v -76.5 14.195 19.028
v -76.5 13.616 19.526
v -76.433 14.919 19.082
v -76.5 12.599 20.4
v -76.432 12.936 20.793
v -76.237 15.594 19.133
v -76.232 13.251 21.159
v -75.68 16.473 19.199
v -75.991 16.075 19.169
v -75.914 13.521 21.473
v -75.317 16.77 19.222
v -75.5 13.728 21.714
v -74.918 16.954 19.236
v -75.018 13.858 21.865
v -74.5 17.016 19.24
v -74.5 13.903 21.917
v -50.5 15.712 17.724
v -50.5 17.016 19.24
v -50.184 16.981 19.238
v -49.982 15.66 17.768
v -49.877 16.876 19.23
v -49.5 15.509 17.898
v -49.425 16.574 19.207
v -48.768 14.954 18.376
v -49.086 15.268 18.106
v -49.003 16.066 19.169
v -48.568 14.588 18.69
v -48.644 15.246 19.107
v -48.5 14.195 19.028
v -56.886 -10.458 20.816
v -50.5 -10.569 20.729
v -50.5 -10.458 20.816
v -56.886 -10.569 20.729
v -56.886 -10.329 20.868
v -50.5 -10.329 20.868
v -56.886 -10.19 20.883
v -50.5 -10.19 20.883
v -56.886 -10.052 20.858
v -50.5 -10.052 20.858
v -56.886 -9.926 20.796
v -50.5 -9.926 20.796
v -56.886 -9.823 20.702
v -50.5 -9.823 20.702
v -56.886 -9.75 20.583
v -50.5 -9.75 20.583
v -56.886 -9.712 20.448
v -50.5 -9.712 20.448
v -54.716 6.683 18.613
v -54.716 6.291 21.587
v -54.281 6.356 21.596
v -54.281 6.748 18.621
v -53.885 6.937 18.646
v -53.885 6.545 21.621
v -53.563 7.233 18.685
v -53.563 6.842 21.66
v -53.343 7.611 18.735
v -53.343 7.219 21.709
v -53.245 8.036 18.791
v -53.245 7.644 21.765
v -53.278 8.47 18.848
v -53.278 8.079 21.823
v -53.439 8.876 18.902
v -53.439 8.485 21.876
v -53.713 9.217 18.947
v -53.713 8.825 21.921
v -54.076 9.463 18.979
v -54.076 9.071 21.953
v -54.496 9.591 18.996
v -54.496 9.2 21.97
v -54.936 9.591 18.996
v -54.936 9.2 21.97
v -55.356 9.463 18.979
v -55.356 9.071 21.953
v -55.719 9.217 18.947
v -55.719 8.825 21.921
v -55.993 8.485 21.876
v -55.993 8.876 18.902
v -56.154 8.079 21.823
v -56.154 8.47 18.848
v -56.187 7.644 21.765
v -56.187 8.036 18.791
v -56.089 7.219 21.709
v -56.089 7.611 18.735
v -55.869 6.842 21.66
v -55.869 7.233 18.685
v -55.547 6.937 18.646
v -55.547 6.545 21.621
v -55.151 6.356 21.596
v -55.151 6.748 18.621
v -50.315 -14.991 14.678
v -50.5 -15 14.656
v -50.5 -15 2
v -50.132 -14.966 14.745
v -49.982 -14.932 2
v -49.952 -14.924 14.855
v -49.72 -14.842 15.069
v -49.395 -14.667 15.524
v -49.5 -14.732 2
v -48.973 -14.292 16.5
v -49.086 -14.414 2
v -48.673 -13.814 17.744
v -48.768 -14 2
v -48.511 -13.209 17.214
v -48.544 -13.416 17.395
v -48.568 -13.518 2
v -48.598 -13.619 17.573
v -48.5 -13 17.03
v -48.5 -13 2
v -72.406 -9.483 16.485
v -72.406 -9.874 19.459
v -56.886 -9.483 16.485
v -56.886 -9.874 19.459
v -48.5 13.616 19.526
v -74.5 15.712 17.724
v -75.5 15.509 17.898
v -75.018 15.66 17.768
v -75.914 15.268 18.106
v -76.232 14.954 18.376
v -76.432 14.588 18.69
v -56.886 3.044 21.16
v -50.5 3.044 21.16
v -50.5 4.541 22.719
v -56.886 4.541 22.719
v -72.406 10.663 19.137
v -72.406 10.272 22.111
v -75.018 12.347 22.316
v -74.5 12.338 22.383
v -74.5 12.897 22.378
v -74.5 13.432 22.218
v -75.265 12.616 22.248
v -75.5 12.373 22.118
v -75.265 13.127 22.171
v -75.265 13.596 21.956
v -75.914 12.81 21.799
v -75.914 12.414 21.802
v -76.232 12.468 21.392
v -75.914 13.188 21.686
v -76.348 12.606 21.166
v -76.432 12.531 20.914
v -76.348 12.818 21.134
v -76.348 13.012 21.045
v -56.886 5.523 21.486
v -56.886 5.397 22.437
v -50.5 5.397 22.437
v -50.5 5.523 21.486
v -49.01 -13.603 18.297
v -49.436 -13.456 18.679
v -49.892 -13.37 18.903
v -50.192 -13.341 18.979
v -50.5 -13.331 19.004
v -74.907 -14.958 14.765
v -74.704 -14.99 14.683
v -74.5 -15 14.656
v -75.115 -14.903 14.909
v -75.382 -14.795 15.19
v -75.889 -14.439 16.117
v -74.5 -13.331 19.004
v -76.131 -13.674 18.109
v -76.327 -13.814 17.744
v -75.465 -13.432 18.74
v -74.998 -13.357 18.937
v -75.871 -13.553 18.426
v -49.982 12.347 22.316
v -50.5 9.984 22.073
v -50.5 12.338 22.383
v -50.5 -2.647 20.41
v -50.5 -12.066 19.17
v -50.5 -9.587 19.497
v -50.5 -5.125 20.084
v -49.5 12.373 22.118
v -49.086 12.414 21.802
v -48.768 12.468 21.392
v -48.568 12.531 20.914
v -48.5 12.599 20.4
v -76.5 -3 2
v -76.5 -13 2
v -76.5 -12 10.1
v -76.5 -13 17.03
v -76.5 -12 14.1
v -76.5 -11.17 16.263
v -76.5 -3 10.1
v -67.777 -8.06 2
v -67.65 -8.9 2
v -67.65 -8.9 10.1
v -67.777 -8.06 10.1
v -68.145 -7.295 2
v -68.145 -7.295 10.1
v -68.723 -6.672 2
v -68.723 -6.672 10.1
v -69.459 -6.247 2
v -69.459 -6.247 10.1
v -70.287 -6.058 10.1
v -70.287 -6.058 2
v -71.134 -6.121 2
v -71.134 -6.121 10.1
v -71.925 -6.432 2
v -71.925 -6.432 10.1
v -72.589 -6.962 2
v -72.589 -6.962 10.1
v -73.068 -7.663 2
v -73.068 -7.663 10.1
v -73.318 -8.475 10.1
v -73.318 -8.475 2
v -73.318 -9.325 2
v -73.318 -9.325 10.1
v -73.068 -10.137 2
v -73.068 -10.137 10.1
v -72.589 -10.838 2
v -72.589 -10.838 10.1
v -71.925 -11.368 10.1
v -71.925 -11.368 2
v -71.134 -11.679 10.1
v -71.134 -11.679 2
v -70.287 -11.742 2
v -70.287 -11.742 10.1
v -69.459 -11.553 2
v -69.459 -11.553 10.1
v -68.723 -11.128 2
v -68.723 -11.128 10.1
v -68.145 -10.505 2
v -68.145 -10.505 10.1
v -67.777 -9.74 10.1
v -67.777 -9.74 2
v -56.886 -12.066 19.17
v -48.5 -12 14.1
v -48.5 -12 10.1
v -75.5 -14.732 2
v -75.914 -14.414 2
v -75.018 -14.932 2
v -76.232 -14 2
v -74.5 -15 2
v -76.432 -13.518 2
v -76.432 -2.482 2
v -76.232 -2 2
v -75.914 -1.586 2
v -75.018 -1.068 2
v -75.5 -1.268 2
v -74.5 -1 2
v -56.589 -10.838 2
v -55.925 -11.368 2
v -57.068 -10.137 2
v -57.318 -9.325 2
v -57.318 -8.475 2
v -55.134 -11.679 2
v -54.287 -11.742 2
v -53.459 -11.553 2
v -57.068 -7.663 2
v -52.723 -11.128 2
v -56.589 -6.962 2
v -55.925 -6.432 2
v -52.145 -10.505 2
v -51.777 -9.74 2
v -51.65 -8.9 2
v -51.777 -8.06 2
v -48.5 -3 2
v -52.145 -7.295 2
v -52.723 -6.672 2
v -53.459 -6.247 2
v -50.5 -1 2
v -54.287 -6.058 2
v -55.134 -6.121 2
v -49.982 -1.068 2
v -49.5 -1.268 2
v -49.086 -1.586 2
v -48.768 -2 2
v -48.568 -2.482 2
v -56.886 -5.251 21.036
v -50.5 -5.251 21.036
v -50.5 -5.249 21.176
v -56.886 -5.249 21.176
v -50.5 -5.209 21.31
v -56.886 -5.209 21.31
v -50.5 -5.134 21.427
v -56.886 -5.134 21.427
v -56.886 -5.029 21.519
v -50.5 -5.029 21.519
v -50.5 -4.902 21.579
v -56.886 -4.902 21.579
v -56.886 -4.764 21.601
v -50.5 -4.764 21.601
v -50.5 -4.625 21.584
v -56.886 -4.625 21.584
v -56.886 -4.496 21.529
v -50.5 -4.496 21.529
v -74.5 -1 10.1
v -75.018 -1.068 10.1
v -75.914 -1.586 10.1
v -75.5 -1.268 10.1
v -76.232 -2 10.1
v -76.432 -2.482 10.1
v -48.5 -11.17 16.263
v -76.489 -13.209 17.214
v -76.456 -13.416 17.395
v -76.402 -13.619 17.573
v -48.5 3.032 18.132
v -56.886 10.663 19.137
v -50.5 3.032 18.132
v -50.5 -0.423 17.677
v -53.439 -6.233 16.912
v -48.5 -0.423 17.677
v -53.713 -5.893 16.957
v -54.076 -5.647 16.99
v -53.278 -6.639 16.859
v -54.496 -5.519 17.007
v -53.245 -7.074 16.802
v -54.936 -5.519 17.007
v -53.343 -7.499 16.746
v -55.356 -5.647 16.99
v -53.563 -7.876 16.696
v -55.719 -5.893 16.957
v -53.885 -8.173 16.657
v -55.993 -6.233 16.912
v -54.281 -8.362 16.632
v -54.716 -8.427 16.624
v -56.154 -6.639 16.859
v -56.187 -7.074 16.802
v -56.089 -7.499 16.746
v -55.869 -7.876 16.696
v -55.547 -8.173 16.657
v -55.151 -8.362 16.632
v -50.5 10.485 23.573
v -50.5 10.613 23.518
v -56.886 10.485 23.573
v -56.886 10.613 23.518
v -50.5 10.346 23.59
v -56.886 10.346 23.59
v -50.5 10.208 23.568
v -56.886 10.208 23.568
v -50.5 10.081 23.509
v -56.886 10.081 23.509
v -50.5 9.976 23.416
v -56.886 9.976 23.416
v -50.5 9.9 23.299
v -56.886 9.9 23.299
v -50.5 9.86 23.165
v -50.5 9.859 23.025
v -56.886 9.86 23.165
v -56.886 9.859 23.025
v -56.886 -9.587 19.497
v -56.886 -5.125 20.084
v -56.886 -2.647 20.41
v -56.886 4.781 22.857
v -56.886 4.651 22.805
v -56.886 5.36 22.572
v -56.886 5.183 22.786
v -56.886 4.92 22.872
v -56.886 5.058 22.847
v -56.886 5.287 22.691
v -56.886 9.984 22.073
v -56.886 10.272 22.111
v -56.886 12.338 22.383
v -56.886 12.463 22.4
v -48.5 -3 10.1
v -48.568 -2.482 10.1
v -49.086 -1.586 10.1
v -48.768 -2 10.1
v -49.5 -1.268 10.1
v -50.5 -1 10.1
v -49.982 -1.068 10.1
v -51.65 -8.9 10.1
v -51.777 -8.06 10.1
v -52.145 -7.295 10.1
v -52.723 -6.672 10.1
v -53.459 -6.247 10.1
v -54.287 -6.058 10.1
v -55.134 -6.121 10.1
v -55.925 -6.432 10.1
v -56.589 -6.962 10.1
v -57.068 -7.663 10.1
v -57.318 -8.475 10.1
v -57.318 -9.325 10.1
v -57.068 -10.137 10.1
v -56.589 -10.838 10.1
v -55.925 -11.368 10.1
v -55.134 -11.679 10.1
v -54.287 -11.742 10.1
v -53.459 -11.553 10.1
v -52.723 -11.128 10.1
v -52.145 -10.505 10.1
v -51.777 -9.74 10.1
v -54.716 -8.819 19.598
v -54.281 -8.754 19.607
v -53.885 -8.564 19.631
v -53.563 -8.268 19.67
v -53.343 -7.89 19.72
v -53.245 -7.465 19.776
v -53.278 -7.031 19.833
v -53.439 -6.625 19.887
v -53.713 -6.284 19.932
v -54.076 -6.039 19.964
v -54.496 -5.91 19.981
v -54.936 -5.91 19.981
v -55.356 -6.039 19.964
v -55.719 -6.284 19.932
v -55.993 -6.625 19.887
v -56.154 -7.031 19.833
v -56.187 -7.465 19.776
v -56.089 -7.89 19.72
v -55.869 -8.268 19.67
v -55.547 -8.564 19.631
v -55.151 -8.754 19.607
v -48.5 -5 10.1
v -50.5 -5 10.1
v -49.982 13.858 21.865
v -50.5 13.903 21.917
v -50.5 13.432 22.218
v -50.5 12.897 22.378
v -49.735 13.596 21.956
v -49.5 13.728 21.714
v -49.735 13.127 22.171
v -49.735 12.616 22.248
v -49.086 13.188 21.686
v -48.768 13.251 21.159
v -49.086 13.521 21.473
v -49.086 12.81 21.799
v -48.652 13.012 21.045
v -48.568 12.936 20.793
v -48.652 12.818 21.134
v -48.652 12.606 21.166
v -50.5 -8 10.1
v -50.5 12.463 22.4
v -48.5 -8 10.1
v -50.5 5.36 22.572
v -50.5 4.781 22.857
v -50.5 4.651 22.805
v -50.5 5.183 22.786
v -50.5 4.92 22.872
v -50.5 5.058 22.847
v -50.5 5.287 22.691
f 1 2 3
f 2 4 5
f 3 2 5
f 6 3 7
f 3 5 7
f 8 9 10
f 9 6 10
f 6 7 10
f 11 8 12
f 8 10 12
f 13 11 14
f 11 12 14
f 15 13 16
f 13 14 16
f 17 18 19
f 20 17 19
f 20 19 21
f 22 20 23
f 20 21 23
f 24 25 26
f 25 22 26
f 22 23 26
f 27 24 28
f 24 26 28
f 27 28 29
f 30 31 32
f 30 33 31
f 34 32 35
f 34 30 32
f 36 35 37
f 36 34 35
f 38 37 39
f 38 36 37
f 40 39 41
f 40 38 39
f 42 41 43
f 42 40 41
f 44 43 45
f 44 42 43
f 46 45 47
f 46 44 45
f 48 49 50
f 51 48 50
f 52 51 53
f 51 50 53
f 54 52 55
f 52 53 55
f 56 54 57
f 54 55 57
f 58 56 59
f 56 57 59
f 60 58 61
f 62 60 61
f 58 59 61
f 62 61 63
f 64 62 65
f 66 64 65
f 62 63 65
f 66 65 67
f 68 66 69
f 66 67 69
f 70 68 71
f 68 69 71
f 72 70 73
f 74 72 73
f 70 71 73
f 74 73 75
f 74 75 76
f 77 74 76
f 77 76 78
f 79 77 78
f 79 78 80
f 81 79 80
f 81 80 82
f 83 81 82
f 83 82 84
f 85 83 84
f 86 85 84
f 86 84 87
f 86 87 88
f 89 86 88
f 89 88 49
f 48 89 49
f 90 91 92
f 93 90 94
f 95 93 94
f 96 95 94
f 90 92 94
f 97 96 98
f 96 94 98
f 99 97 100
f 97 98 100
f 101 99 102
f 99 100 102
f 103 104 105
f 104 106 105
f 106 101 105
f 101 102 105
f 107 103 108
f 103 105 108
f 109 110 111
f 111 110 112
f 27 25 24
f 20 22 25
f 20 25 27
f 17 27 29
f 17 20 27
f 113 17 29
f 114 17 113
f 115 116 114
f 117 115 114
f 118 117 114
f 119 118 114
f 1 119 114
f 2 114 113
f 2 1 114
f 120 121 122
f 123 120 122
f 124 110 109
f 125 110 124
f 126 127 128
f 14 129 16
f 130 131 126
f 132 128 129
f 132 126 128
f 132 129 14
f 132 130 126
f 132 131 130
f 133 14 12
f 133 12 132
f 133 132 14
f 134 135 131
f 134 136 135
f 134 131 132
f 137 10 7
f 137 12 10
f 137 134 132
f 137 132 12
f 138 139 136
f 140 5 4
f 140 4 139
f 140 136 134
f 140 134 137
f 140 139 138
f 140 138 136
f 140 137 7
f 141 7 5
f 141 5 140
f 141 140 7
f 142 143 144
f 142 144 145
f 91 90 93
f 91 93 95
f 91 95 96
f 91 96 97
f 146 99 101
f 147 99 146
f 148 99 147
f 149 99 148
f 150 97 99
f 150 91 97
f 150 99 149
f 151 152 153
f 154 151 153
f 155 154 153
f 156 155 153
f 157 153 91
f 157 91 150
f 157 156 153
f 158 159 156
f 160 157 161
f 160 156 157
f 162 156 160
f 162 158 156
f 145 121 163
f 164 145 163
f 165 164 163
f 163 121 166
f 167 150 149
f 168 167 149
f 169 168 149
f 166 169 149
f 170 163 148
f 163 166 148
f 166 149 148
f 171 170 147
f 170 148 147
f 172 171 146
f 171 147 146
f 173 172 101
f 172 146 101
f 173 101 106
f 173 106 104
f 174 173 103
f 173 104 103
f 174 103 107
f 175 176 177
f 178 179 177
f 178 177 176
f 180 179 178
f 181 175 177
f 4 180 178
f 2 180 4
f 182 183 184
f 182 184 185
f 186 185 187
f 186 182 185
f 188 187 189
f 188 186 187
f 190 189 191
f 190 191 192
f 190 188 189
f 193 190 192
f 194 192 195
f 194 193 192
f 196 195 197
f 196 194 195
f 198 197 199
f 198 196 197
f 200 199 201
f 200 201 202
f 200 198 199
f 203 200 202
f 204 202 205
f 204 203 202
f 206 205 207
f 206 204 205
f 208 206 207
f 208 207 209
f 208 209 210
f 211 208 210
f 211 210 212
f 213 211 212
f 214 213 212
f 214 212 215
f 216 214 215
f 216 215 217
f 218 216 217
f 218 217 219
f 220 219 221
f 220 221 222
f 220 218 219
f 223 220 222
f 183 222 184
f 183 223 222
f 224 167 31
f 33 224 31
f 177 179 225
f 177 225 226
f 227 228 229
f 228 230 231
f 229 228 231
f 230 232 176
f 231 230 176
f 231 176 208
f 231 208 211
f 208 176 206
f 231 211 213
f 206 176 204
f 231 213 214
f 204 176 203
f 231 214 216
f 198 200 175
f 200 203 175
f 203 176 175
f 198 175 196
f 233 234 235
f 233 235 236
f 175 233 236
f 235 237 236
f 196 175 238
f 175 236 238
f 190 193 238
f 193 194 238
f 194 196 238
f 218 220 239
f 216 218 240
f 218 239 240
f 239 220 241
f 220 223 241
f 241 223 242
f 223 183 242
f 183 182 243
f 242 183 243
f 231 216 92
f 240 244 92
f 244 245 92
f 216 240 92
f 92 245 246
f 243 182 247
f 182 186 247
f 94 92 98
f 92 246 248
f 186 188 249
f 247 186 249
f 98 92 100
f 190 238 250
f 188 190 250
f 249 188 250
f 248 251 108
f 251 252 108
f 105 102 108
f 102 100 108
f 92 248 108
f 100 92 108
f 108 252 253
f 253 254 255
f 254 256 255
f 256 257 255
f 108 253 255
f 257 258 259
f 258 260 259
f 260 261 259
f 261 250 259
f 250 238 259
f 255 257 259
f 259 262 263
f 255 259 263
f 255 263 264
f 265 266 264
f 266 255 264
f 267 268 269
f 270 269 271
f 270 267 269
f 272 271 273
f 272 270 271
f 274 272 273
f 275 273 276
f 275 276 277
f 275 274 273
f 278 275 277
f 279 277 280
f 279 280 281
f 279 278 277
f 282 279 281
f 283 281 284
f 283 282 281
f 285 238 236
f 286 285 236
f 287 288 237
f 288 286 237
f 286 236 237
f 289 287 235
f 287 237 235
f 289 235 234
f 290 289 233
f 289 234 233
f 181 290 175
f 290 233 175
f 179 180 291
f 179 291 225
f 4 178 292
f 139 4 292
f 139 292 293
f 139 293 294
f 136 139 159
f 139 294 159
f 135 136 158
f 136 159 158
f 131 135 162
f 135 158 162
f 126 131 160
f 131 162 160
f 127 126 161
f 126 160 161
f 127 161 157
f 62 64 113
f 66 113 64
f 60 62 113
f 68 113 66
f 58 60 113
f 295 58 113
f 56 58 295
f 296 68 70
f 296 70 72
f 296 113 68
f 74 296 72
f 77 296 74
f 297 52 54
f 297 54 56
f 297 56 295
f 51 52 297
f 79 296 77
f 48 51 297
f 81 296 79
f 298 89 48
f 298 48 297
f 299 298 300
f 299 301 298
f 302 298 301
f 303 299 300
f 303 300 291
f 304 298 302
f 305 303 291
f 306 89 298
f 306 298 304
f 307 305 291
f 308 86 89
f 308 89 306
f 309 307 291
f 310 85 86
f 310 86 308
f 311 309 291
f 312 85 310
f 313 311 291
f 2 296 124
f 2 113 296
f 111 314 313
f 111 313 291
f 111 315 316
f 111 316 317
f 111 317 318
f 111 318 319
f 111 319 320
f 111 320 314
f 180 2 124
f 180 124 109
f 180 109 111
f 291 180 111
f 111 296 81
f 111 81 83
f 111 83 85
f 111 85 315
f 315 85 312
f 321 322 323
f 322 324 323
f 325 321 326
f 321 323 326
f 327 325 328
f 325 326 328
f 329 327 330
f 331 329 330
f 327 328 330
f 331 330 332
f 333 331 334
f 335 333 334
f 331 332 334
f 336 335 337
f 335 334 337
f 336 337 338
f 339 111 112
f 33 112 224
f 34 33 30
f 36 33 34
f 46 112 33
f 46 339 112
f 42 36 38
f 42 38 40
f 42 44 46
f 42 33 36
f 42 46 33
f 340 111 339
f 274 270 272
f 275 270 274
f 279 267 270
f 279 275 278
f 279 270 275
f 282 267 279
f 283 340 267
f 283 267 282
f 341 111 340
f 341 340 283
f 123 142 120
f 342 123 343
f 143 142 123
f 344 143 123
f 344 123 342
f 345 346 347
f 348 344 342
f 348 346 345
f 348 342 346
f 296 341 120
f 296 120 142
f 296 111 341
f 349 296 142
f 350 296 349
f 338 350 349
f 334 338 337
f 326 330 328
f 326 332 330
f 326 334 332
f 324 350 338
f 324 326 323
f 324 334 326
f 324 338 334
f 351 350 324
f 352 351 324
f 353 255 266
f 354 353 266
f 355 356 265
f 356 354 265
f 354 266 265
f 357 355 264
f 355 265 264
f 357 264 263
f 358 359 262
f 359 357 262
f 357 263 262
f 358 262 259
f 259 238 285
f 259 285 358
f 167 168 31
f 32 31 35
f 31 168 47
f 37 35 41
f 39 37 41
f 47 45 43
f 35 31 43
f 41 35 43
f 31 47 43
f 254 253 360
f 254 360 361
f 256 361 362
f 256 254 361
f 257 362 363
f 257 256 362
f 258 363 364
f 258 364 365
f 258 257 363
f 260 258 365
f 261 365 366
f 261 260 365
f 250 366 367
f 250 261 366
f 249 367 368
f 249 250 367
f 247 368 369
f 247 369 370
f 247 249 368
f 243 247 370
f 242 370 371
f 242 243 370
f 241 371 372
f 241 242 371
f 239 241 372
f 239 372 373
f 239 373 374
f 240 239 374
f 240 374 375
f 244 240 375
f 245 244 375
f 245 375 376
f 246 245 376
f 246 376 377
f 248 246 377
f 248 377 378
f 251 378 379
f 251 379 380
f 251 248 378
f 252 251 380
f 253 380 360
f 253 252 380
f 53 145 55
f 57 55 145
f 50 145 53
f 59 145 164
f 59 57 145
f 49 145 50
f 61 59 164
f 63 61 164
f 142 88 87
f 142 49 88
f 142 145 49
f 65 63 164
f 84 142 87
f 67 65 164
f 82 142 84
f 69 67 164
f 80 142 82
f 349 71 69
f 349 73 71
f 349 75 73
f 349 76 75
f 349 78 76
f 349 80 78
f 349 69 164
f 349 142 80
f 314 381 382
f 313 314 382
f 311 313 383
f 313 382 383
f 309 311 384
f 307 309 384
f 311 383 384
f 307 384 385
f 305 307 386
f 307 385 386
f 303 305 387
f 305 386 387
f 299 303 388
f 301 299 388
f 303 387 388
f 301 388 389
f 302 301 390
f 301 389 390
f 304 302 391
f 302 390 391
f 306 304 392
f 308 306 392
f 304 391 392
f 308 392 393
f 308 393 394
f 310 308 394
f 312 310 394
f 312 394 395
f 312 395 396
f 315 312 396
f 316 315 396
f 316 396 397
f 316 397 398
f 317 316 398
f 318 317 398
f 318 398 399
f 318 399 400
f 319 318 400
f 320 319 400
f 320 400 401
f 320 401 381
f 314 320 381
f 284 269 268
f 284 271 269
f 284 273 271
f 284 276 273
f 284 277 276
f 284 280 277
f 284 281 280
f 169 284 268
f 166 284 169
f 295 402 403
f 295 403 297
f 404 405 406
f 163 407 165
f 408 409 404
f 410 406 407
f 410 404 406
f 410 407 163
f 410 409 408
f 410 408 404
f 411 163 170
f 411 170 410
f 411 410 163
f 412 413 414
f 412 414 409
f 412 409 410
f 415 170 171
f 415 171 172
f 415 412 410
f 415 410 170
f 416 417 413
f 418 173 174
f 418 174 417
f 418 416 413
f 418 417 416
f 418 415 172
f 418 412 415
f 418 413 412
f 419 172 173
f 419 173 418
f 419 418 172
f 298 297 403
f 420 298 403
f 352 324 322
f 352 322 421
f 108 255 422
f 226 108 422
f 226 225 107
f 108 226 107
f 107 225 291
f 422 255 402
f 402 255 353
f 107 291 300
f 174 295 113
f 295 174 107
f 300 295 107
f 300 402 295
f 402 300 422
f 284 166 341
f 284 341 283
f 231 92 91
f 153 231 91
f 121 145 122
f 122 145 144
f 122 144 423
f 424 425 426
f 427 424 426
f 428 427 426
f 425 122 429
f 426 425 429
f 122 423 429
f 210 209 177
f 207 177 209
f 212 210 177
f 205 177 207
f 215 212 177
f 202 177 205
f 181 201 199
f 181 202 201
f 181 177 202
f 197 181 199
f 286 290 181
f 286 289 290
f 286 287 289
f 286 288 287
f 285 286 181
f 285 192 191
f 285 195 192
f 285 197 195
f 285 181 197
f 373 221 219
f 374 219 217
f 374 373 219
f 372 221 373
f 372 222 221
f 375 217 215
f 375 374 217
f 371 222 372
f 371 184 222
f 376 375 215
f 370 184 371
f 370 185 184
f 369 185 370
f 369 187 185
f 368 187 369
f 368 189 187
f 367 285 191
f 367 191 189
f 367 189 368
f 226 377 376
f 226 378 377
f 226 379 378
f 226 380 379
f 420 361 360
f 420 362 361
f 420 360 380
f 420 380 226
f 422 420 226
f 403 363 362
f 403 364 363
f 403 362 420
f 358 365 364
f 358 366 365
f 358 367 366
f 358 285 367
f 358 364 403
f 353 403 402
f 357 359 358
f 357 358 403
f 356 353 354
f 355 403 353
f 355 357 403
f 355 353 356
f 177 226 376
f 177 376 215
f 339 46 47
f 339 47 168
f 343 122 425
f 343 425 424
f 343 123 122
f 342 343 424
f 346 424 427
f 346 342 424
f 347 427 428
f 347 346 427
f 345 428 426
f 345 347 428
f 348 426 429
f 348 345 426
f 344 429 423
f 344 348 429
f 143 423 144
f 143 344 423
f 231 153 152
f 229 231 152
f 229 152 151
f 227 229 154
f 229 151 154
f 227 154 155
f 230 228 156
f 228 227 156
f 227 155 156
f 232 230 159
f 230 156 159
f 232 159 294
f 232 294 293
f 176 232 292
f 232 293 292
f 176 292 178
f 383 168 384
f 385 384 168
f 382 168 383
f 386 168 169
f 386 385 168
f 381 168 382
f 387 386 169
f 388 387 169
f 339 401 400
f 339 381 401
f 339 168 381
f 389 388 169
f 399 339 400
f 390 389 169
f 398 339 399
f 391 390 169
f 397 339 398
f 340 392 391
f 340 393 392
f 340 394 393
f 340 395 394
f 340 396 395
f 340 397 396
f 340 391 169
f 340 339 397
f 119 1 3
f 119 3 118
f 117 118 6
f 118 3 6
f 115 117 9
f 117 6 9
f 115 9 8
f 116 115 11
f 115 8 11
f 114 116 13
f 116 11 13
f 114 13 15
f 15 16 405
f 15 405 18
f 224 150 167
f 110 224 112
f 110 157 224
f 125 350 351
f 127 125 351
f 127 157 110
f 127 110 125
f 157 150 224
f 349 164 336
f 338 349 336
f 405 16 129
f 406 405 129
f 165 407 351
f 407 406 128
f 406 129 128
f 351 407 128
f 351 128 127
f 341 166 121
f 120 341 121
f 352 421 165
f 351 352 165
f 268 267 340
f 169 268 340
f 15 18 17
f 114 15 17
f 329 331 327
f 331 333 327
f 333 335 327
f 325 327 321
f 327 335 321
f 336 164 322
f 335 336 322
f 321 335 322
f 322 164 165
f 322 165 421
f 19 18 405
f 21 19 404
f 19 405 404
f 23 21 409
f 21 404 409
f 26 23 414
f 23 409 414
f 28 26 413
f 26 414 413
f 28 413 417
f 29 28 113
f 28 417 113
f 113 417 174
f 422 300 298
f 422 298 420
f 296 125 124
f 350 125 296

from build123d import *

# Parameters (mm, degrees)
BOSS_EXTRUDE1_START = 2
SKETCH2_W           = 28
SKETCH2_H           = 14
SKETCH2_R           = 2.85
BOSS_EXTRUDE1_DEPTH = 8.1
BOSS_EXTRUDE5_DEPTH = 28
CUT_EXTRUDE1_REACH  = 83.112
SKETCH7_R           = 1.475
SKETCH7_W           = 15.52
SKETCH7_H           = 20.32
BOSS_EXTRUDE7_DEPTH = 2
FILLET1_R           = 2
BOSS_EXTRUDE8_START = -2
BOSS_EXTRUDE8_DEPTH = 6.386
FILLET2_R           = 0.5


with BuildPart() as part:
    # Sketch2 → Boss-Extrude1 (new body)
    with BuildSketch(Plane.XY.offset(BOSS_EXTRUDE1_START)):
        with Locations((-62.5, -8)):
            Rectangle(SKETCH2_W, SKETCH2_H)
        with Locations((-54.5, -8.9)):
            Circle(SKETCH2_R, mode=Mode.SUBTRACT)
        with Locations((-70.5, -8.9)):
            Circle(SKETCH2_R, mode=Mode.SUBTRACT)
    extrude(amount=BOSS_EXTRUDE1_DEPTH)

    # Sketch6 → Boss-Extrude5 (add)
    with BuildSketch(Plane.ZY.offset(76.5)):
        Polygon((10.1, -15), (14.656017135, -15), (19.003880422, -13.331011655), (22.5, 13.224653006), (19.240190464, 17.015911609), (17.723687023, 15.711987794), (19.525665416, 13.616231583), (16.26251061, -11.169889951), (14.1, -12), (10.1, -12), align=None)
    extrude(amount=-BOSS_EXTRUDE5_DEPTH)

    # Sketch7 → Cut-Extrude1 (cut, up to next)
    with BuildSketch(Plane(origin=(0, -2.686404695, 20.405269514), x_dir=(1, 0, 0), z_dir=(0, -0.13052619222004436, 0.9914448613738114)), mode=Mode.PRIVATE) as cut_extrude1_sk1:
        with Locations(Location((-54.716, -4.710052631, 0), (0, 0, 270))):
            Circle(SKETCH7_R)
    cut_extrude1_tool1 = extrude(cut_extrude1_sk1.sketch, amount=-CUT_EXTRUDE1_REACH, mode=Mode.PRIVATE) & part.part
    # Sketch7 → Cut-Extrude1 (cut, up to next)
    with BuildSketch(Plane(origin=(0, -2.686404695, 20.405269514), x_dir=(1, 0, 0), z_dir=(0, -0.13052619222004436, 0.9914448613738114)), mode=Mode.PRIVATE) as cut_extrude1_sk2:
        with Locations(Location((-54.716, 10.529947369, 0), (0, 0, 270))):
            Circle(SKETCH7_R)
    cut_extrude1_tool2 = extrude(cut_extrude1_sk2.sketch, amount=-CUT_EXTRUDE1_REACH, mode=Mode.PRIVATE) & part.part
    # Sketch7 → Cut-Extrude1 (cut, up to next)
    with BuildSketch(Plane(origin=(0, -2.686404695, 20.405269514), x_dir=(1, 0, 0), z_dir=(0, -0.13052619222004436, 0.9914448613738114)), mode=Mode.PRIVATE) as cut_extrude1_sk3:
        with Locations((-64.646, 2.909947369)):
            Rectangle(SKETCH7_W, SKETCH7_H)
    cut_extrude1_tool3 = extrude(cut_extrude1_sk3.sketch, amount=-CUT_EXTRUDE1_REACH, mode=Mode.PRIVATE) & part.part
    add(cut_extrude1_tool1.solids().sort_by_distance((-54.716, -7.356162, 19.790484))[0], mode=Mode.SUBTRACT)
    add(cut_extrude1_tool2.solids().sort_by_distance((-54.716, 7.753458, 21.779703))[0], mode=Mode.SUBTRACT)
    add(cut_extrude1_tool3.solids().sort_by_distance((-64.646, 0.198648, 20.785094))[0], mode=Mode.SUBTRACT)

    # Sketch10 → Boss-Extrude7 (add)
    with BuildSketch(Plane(origin=(-48.5, 0, 0), x_dir=(0, 0, -1), z_dir=(1, 0, 0))):
        Polygon((-18.13225899, 3.03225899), (-17.67742093, -0.42257907), (-10.1, -8), (-10.1, -5), align=None)
    extrude(amount=-BOSS_EXTRUDE7_DEPTH)

    # Fillet1
    # the kernel refuses this fillet: 2 mm, written as the material it takes off along each edge
    with BuildSketch(Plane(origin=(-50.5, 12.598930148, 20.400364102), x_dir=(0, 0.6519619071782031, 0.758251720465282), z_dir=(1, 0, 0))) as fillet1_piece_1_section:
        Polygon((0, 0), (FILLET1_R * 1.02, 0), (FILLET1_R * 1.02, FILLET1_R * 0.45615786741), (FILLET1_R * 0.68, FILLET1_R * 0.76026311235), align=None)
    fillet1_piece_1 = extrude(amount=FILLET1_R * 1.02, mode=Mode.PRIVATE)
    fillet1_piece_1 = fillet1_piece_1 - Plane(origin=(-50.5, 12.598930148, 20.400364102), x_dir=(0, -0.28560210337141756, -0.9583482866629555), z_dir=(1, 0, 0)) * Sphere(FILLET1_R, mode=Mode.PRIVATE)
    add(fillet1_piece_1, mode=Mode.SUBTRACT)
    with BuildSketch(Plane(origin=(-74.5, 12.598930148, 20.400364102), x_dir=(0, 0.6519619071782031, 0.758251720465282), z_dir=(-1, 0, 0))) as fillet1_piece_2_section:
        Polygon((0, 0), (FILLET1_R * 1.02, 0), (FILLET1_R * 1.02, -FILLET1_R * 0.45615786741), (FILLET1_R * 0.68, -FILLET1_R * 0.76026311235), align=None)
    fillet1_piece_2 = extrude(amount=FILLET1_R * 1.02, mode=Mode.PRIVATE)
    fillet1_piece_2 = fillet1_piece_2 - Plane(origin=(-74.5, 12.598930148, 20.400364102), x_dir=(0, -0.28560210337141756, -0.9583482866629555), z_dir=(-1, 0, 0)) * Sphere(FILLET1_R, mode=Mode.PRIVATE)
    add(fillet1_piece_2, mode=Mode.SUBTRACT)
    with BuildSketch(Plane(origin=(-76.5, -15, 19.656017135), x_dir=(1, 0, 0), z_dir=(0, 0, -1)), Plane(origin=(-48.5, -15, -3), x_dir=(-1, 0, 0), z_dir=(0, 0, 1))) as fillet1_piece_3:
        with BuildLine():
            CenterArc((FILLET1_R, -FILLET1_R), FILLET1_R, 90, 90)
            Line((0, -FILLET1_R), (0, 0))
            Line((0, 0), (FILLET1_R, 0))
        make_face()
    extrude(amount=22.656017135, mode=Mode.SUBTRACT)
    with BuildSketch(Plane(origin=(-76.5, -1, -3), x_dir=(0, -1, 0), z_dir=(0, 0, 1))) as fillet1_piece_4:
        with BuildLine():
            CenterArc((FILLET1_R, FILLET1_R), FILLET1_R, 180, 90)
            Line((0, FILLET1_R), (0, 0))
            Line((0, 0), (FILLET1_R, 0))
        make_face()
    extrude(amount=18.1, mode=Mode.SUBTRACT)
    with BuildSketch(Plane(origin=(-48.5, -1, -3), x_dir=(0, -1, 0), z_dir=(0, 0, 1))) as fillet1_piece_5_section:
        with BuildLine():
            CenterArc((FILLET1_R, -FILLET1_R), FILLET1_R, 90, 90)
            Line((0, -FILLET1_R), (0, 0))
            Line((0, 0), (FILLET1_R, 0))
        make_face()
    fillet1_piece_5 = extrude(amount=18.1, mode=Mode.PRIVATE)
    fillet1_piece_5 = split(fillet1_piece_5, bisect_by=Plane(origin=(-48.946735878, -5.248367939, 9.851632061), z_dir=(0, 0.707106781186545, -0.7071067811865501)), keep=Keep.TOP, mode=Mode.PRIVATE)
    add(fillet1_piece_5, mode=Mode.SUBTRACT)
    with BuildSketch(Plane(origin=(-48.5, 13.902853963, 21.916867543), x_dir=(0, -0.6519619071782031, -0.758251720465282), z_dir=(0, 0.758251720465282, -0.6519619071782031))) as fillet1_piece_6:
        with BuildLine():
            CenterArc((FILLET1_R, FILLET1_R), FILLET1_R, 180, 90)
            Line((0, FILLET1_R), (0, 0))
            Line((0, 0), (FILLET1_R, 0))
        make_face()
    extrude(amount=9.105572809, mode=Mode.SUBTRACT)
    with BuildSketch(Plane(origin=(-76.5, 13.902853963, 21.916867543), x_dir=(0, -0.6519619071782031, -0.758251720465282), z_dir=(0, 0.758251720465282, -0.6519619071782031))) as fillet1_piece_7:
        with BuildLine():
            CenterArc((FILLET1_R, -FILLET1_R), FILLET1_R, 90, 90)
            Line((0, -FILLET1_R), (0, 0))
            Line((0, 0), (FILLET1_R, 0))
        make_face()
    extrude(amount=9.105572809, mode=Mode.SUBTRACT)
    with BuildSketch(Plane(origin=(-48.5, -18.288235962, 18.351249461), x_dir=(0, 0.1305261922200442, -0.9914448613738114), z_dir=(0, 0.9914448613738114, 0.13052619222004422))) as fillet1_piece_8:
        with BuildLine():
            CenterArc((FILLET1_R, FILLET1_R), FILLET1_R, 180, 90)
            Line((0, FILLET1_R), (0, 0))
            Line((0, 0), (FILLET1_R, 0))
        make_face()
    extrude(amount=30.890385254, mode=Mode.SUBTRACT)
    with BuildSketch(Plane(origin=(-76.5, -18.288235962, 18.351249461), x_dir=(0, 0.1305261922200442, -0.9914448613738114), z_dir=(0, 0.9914448613738114, 0.13052619222004422))) as fillet1_piece_9:
        with BuildLine():
            CenterArc((FILLET1_R, -FILLET1_R), FILLET1_R, 90, 90)
            Line((0, -FILLET1_R), (0, 0))
            Line((0, 0), (FILLET1_R, 0))
        make_face()
    extrude(amount=30.890385254, mode=Mode.SUBTRACT)
    with BuildSketch(Plane(origin=(-74.5, 13.224653006, 22.5), x_dir=(0, 0.7582517204652818, -0.6519619071782033), z_dir=(1, 0, 0))) as fillet1_piece_10:
        with BuildLine():
            CenterArc((FILLET1_R * 0.4472135955, -FILLET1_R), FILLET1_R, 90, 48.189685104)
            Line((-FILLET1_R * 0.298142397, -FILLET1_R * 0.333333333333), (0, 0))
            Line((0, 0), (FILLET1_R * 0.4472135955, 0))
        make_face()
    extrude(amount=24, mode=Mode.SUBTRACT)
    with BuildSketch(Plane(origin=(-48.5, 20.275721145, 23.031449066), x_dir=(0, -0.7582517204652808, 0.6519619071782047), z_dir=(0, -0.6519619071782047, -0.7582517204652808))) as fillet1_piece_11:
        with BuildLine():
            CenterArc((FILLET1_R, FILLET1_R), FILLET1_R, 180, 90)
            Line((0, FILLET1_R), (0, 0))
            Line((0, 0), (FILLET1_R, 0))
        make_face()
    extrude(amount=12, mode=Mode.SUBTRACT)
    with BuildSketch(Plane(origin=(-76.5, 20.275721145, 23.031449066), x_dir=(0, -0.7582517204652808, 0.6519619071782046), z_dir=(0, -0.6519619071782047, -0.7582517204652808))) as fillet1_piece_12:
        with BuildLine():
            CenterArc((FILLET1_R, -FILLET1_R), FILLET1_R, 90, 90)
            Line((0, -FILLET1_R), (0, 0))
            Line((0, 0), (FILLET1_R, 0))
        make_face()
    extrude(amount=12, mode=Mode.SUBTRACT)

    # Sketch11 → Boss-Extrude8 (add)
    with BuildSketch(Plane(origin=(-48.5, 0, 0), x_dir=(0, 0, -1), z_dir=(1, 0, 0)).offset(BOSS_EXTRUDE8_START)):
        Polygon((-21.159704036, 3.044094423), (-23.468909239, 5.261654192), (-21.486019516, 5.522706576), align=None)
        Polygon((-22.399702862, 12.462820606), (-22.073387381, 9.984208452), (-24.056277104, 9.723156068), align=None)
        Polygon((-21.479690069, -9.847965496), (-19.496800347, -9.586913111), (-19.170484866, -12.065525265), align=None)
        Polygon((-22.067057934, -5.386463619), (-20.084168212, -5.125411235), (-20.410483692, -2.646799082), align=None)
    extrude(amount=-BOSS_EXTRUDE8_DEPTH)

    # Fillet2
    fillet2_edges = [part.edges().sort_by_distance(p)[0] for p in [
        (-53.693, 5.261654192, 23.468909239),
        (-53.693, 9.723156068, 24.056277104),
        (-53.693, -5.386463619, 22.067057934),
        (-53.693, -9.847965496, 21.479690069),
    ]]
    fillet(fillet2_edges, radius=FILLET2_R)


solid = part.part
